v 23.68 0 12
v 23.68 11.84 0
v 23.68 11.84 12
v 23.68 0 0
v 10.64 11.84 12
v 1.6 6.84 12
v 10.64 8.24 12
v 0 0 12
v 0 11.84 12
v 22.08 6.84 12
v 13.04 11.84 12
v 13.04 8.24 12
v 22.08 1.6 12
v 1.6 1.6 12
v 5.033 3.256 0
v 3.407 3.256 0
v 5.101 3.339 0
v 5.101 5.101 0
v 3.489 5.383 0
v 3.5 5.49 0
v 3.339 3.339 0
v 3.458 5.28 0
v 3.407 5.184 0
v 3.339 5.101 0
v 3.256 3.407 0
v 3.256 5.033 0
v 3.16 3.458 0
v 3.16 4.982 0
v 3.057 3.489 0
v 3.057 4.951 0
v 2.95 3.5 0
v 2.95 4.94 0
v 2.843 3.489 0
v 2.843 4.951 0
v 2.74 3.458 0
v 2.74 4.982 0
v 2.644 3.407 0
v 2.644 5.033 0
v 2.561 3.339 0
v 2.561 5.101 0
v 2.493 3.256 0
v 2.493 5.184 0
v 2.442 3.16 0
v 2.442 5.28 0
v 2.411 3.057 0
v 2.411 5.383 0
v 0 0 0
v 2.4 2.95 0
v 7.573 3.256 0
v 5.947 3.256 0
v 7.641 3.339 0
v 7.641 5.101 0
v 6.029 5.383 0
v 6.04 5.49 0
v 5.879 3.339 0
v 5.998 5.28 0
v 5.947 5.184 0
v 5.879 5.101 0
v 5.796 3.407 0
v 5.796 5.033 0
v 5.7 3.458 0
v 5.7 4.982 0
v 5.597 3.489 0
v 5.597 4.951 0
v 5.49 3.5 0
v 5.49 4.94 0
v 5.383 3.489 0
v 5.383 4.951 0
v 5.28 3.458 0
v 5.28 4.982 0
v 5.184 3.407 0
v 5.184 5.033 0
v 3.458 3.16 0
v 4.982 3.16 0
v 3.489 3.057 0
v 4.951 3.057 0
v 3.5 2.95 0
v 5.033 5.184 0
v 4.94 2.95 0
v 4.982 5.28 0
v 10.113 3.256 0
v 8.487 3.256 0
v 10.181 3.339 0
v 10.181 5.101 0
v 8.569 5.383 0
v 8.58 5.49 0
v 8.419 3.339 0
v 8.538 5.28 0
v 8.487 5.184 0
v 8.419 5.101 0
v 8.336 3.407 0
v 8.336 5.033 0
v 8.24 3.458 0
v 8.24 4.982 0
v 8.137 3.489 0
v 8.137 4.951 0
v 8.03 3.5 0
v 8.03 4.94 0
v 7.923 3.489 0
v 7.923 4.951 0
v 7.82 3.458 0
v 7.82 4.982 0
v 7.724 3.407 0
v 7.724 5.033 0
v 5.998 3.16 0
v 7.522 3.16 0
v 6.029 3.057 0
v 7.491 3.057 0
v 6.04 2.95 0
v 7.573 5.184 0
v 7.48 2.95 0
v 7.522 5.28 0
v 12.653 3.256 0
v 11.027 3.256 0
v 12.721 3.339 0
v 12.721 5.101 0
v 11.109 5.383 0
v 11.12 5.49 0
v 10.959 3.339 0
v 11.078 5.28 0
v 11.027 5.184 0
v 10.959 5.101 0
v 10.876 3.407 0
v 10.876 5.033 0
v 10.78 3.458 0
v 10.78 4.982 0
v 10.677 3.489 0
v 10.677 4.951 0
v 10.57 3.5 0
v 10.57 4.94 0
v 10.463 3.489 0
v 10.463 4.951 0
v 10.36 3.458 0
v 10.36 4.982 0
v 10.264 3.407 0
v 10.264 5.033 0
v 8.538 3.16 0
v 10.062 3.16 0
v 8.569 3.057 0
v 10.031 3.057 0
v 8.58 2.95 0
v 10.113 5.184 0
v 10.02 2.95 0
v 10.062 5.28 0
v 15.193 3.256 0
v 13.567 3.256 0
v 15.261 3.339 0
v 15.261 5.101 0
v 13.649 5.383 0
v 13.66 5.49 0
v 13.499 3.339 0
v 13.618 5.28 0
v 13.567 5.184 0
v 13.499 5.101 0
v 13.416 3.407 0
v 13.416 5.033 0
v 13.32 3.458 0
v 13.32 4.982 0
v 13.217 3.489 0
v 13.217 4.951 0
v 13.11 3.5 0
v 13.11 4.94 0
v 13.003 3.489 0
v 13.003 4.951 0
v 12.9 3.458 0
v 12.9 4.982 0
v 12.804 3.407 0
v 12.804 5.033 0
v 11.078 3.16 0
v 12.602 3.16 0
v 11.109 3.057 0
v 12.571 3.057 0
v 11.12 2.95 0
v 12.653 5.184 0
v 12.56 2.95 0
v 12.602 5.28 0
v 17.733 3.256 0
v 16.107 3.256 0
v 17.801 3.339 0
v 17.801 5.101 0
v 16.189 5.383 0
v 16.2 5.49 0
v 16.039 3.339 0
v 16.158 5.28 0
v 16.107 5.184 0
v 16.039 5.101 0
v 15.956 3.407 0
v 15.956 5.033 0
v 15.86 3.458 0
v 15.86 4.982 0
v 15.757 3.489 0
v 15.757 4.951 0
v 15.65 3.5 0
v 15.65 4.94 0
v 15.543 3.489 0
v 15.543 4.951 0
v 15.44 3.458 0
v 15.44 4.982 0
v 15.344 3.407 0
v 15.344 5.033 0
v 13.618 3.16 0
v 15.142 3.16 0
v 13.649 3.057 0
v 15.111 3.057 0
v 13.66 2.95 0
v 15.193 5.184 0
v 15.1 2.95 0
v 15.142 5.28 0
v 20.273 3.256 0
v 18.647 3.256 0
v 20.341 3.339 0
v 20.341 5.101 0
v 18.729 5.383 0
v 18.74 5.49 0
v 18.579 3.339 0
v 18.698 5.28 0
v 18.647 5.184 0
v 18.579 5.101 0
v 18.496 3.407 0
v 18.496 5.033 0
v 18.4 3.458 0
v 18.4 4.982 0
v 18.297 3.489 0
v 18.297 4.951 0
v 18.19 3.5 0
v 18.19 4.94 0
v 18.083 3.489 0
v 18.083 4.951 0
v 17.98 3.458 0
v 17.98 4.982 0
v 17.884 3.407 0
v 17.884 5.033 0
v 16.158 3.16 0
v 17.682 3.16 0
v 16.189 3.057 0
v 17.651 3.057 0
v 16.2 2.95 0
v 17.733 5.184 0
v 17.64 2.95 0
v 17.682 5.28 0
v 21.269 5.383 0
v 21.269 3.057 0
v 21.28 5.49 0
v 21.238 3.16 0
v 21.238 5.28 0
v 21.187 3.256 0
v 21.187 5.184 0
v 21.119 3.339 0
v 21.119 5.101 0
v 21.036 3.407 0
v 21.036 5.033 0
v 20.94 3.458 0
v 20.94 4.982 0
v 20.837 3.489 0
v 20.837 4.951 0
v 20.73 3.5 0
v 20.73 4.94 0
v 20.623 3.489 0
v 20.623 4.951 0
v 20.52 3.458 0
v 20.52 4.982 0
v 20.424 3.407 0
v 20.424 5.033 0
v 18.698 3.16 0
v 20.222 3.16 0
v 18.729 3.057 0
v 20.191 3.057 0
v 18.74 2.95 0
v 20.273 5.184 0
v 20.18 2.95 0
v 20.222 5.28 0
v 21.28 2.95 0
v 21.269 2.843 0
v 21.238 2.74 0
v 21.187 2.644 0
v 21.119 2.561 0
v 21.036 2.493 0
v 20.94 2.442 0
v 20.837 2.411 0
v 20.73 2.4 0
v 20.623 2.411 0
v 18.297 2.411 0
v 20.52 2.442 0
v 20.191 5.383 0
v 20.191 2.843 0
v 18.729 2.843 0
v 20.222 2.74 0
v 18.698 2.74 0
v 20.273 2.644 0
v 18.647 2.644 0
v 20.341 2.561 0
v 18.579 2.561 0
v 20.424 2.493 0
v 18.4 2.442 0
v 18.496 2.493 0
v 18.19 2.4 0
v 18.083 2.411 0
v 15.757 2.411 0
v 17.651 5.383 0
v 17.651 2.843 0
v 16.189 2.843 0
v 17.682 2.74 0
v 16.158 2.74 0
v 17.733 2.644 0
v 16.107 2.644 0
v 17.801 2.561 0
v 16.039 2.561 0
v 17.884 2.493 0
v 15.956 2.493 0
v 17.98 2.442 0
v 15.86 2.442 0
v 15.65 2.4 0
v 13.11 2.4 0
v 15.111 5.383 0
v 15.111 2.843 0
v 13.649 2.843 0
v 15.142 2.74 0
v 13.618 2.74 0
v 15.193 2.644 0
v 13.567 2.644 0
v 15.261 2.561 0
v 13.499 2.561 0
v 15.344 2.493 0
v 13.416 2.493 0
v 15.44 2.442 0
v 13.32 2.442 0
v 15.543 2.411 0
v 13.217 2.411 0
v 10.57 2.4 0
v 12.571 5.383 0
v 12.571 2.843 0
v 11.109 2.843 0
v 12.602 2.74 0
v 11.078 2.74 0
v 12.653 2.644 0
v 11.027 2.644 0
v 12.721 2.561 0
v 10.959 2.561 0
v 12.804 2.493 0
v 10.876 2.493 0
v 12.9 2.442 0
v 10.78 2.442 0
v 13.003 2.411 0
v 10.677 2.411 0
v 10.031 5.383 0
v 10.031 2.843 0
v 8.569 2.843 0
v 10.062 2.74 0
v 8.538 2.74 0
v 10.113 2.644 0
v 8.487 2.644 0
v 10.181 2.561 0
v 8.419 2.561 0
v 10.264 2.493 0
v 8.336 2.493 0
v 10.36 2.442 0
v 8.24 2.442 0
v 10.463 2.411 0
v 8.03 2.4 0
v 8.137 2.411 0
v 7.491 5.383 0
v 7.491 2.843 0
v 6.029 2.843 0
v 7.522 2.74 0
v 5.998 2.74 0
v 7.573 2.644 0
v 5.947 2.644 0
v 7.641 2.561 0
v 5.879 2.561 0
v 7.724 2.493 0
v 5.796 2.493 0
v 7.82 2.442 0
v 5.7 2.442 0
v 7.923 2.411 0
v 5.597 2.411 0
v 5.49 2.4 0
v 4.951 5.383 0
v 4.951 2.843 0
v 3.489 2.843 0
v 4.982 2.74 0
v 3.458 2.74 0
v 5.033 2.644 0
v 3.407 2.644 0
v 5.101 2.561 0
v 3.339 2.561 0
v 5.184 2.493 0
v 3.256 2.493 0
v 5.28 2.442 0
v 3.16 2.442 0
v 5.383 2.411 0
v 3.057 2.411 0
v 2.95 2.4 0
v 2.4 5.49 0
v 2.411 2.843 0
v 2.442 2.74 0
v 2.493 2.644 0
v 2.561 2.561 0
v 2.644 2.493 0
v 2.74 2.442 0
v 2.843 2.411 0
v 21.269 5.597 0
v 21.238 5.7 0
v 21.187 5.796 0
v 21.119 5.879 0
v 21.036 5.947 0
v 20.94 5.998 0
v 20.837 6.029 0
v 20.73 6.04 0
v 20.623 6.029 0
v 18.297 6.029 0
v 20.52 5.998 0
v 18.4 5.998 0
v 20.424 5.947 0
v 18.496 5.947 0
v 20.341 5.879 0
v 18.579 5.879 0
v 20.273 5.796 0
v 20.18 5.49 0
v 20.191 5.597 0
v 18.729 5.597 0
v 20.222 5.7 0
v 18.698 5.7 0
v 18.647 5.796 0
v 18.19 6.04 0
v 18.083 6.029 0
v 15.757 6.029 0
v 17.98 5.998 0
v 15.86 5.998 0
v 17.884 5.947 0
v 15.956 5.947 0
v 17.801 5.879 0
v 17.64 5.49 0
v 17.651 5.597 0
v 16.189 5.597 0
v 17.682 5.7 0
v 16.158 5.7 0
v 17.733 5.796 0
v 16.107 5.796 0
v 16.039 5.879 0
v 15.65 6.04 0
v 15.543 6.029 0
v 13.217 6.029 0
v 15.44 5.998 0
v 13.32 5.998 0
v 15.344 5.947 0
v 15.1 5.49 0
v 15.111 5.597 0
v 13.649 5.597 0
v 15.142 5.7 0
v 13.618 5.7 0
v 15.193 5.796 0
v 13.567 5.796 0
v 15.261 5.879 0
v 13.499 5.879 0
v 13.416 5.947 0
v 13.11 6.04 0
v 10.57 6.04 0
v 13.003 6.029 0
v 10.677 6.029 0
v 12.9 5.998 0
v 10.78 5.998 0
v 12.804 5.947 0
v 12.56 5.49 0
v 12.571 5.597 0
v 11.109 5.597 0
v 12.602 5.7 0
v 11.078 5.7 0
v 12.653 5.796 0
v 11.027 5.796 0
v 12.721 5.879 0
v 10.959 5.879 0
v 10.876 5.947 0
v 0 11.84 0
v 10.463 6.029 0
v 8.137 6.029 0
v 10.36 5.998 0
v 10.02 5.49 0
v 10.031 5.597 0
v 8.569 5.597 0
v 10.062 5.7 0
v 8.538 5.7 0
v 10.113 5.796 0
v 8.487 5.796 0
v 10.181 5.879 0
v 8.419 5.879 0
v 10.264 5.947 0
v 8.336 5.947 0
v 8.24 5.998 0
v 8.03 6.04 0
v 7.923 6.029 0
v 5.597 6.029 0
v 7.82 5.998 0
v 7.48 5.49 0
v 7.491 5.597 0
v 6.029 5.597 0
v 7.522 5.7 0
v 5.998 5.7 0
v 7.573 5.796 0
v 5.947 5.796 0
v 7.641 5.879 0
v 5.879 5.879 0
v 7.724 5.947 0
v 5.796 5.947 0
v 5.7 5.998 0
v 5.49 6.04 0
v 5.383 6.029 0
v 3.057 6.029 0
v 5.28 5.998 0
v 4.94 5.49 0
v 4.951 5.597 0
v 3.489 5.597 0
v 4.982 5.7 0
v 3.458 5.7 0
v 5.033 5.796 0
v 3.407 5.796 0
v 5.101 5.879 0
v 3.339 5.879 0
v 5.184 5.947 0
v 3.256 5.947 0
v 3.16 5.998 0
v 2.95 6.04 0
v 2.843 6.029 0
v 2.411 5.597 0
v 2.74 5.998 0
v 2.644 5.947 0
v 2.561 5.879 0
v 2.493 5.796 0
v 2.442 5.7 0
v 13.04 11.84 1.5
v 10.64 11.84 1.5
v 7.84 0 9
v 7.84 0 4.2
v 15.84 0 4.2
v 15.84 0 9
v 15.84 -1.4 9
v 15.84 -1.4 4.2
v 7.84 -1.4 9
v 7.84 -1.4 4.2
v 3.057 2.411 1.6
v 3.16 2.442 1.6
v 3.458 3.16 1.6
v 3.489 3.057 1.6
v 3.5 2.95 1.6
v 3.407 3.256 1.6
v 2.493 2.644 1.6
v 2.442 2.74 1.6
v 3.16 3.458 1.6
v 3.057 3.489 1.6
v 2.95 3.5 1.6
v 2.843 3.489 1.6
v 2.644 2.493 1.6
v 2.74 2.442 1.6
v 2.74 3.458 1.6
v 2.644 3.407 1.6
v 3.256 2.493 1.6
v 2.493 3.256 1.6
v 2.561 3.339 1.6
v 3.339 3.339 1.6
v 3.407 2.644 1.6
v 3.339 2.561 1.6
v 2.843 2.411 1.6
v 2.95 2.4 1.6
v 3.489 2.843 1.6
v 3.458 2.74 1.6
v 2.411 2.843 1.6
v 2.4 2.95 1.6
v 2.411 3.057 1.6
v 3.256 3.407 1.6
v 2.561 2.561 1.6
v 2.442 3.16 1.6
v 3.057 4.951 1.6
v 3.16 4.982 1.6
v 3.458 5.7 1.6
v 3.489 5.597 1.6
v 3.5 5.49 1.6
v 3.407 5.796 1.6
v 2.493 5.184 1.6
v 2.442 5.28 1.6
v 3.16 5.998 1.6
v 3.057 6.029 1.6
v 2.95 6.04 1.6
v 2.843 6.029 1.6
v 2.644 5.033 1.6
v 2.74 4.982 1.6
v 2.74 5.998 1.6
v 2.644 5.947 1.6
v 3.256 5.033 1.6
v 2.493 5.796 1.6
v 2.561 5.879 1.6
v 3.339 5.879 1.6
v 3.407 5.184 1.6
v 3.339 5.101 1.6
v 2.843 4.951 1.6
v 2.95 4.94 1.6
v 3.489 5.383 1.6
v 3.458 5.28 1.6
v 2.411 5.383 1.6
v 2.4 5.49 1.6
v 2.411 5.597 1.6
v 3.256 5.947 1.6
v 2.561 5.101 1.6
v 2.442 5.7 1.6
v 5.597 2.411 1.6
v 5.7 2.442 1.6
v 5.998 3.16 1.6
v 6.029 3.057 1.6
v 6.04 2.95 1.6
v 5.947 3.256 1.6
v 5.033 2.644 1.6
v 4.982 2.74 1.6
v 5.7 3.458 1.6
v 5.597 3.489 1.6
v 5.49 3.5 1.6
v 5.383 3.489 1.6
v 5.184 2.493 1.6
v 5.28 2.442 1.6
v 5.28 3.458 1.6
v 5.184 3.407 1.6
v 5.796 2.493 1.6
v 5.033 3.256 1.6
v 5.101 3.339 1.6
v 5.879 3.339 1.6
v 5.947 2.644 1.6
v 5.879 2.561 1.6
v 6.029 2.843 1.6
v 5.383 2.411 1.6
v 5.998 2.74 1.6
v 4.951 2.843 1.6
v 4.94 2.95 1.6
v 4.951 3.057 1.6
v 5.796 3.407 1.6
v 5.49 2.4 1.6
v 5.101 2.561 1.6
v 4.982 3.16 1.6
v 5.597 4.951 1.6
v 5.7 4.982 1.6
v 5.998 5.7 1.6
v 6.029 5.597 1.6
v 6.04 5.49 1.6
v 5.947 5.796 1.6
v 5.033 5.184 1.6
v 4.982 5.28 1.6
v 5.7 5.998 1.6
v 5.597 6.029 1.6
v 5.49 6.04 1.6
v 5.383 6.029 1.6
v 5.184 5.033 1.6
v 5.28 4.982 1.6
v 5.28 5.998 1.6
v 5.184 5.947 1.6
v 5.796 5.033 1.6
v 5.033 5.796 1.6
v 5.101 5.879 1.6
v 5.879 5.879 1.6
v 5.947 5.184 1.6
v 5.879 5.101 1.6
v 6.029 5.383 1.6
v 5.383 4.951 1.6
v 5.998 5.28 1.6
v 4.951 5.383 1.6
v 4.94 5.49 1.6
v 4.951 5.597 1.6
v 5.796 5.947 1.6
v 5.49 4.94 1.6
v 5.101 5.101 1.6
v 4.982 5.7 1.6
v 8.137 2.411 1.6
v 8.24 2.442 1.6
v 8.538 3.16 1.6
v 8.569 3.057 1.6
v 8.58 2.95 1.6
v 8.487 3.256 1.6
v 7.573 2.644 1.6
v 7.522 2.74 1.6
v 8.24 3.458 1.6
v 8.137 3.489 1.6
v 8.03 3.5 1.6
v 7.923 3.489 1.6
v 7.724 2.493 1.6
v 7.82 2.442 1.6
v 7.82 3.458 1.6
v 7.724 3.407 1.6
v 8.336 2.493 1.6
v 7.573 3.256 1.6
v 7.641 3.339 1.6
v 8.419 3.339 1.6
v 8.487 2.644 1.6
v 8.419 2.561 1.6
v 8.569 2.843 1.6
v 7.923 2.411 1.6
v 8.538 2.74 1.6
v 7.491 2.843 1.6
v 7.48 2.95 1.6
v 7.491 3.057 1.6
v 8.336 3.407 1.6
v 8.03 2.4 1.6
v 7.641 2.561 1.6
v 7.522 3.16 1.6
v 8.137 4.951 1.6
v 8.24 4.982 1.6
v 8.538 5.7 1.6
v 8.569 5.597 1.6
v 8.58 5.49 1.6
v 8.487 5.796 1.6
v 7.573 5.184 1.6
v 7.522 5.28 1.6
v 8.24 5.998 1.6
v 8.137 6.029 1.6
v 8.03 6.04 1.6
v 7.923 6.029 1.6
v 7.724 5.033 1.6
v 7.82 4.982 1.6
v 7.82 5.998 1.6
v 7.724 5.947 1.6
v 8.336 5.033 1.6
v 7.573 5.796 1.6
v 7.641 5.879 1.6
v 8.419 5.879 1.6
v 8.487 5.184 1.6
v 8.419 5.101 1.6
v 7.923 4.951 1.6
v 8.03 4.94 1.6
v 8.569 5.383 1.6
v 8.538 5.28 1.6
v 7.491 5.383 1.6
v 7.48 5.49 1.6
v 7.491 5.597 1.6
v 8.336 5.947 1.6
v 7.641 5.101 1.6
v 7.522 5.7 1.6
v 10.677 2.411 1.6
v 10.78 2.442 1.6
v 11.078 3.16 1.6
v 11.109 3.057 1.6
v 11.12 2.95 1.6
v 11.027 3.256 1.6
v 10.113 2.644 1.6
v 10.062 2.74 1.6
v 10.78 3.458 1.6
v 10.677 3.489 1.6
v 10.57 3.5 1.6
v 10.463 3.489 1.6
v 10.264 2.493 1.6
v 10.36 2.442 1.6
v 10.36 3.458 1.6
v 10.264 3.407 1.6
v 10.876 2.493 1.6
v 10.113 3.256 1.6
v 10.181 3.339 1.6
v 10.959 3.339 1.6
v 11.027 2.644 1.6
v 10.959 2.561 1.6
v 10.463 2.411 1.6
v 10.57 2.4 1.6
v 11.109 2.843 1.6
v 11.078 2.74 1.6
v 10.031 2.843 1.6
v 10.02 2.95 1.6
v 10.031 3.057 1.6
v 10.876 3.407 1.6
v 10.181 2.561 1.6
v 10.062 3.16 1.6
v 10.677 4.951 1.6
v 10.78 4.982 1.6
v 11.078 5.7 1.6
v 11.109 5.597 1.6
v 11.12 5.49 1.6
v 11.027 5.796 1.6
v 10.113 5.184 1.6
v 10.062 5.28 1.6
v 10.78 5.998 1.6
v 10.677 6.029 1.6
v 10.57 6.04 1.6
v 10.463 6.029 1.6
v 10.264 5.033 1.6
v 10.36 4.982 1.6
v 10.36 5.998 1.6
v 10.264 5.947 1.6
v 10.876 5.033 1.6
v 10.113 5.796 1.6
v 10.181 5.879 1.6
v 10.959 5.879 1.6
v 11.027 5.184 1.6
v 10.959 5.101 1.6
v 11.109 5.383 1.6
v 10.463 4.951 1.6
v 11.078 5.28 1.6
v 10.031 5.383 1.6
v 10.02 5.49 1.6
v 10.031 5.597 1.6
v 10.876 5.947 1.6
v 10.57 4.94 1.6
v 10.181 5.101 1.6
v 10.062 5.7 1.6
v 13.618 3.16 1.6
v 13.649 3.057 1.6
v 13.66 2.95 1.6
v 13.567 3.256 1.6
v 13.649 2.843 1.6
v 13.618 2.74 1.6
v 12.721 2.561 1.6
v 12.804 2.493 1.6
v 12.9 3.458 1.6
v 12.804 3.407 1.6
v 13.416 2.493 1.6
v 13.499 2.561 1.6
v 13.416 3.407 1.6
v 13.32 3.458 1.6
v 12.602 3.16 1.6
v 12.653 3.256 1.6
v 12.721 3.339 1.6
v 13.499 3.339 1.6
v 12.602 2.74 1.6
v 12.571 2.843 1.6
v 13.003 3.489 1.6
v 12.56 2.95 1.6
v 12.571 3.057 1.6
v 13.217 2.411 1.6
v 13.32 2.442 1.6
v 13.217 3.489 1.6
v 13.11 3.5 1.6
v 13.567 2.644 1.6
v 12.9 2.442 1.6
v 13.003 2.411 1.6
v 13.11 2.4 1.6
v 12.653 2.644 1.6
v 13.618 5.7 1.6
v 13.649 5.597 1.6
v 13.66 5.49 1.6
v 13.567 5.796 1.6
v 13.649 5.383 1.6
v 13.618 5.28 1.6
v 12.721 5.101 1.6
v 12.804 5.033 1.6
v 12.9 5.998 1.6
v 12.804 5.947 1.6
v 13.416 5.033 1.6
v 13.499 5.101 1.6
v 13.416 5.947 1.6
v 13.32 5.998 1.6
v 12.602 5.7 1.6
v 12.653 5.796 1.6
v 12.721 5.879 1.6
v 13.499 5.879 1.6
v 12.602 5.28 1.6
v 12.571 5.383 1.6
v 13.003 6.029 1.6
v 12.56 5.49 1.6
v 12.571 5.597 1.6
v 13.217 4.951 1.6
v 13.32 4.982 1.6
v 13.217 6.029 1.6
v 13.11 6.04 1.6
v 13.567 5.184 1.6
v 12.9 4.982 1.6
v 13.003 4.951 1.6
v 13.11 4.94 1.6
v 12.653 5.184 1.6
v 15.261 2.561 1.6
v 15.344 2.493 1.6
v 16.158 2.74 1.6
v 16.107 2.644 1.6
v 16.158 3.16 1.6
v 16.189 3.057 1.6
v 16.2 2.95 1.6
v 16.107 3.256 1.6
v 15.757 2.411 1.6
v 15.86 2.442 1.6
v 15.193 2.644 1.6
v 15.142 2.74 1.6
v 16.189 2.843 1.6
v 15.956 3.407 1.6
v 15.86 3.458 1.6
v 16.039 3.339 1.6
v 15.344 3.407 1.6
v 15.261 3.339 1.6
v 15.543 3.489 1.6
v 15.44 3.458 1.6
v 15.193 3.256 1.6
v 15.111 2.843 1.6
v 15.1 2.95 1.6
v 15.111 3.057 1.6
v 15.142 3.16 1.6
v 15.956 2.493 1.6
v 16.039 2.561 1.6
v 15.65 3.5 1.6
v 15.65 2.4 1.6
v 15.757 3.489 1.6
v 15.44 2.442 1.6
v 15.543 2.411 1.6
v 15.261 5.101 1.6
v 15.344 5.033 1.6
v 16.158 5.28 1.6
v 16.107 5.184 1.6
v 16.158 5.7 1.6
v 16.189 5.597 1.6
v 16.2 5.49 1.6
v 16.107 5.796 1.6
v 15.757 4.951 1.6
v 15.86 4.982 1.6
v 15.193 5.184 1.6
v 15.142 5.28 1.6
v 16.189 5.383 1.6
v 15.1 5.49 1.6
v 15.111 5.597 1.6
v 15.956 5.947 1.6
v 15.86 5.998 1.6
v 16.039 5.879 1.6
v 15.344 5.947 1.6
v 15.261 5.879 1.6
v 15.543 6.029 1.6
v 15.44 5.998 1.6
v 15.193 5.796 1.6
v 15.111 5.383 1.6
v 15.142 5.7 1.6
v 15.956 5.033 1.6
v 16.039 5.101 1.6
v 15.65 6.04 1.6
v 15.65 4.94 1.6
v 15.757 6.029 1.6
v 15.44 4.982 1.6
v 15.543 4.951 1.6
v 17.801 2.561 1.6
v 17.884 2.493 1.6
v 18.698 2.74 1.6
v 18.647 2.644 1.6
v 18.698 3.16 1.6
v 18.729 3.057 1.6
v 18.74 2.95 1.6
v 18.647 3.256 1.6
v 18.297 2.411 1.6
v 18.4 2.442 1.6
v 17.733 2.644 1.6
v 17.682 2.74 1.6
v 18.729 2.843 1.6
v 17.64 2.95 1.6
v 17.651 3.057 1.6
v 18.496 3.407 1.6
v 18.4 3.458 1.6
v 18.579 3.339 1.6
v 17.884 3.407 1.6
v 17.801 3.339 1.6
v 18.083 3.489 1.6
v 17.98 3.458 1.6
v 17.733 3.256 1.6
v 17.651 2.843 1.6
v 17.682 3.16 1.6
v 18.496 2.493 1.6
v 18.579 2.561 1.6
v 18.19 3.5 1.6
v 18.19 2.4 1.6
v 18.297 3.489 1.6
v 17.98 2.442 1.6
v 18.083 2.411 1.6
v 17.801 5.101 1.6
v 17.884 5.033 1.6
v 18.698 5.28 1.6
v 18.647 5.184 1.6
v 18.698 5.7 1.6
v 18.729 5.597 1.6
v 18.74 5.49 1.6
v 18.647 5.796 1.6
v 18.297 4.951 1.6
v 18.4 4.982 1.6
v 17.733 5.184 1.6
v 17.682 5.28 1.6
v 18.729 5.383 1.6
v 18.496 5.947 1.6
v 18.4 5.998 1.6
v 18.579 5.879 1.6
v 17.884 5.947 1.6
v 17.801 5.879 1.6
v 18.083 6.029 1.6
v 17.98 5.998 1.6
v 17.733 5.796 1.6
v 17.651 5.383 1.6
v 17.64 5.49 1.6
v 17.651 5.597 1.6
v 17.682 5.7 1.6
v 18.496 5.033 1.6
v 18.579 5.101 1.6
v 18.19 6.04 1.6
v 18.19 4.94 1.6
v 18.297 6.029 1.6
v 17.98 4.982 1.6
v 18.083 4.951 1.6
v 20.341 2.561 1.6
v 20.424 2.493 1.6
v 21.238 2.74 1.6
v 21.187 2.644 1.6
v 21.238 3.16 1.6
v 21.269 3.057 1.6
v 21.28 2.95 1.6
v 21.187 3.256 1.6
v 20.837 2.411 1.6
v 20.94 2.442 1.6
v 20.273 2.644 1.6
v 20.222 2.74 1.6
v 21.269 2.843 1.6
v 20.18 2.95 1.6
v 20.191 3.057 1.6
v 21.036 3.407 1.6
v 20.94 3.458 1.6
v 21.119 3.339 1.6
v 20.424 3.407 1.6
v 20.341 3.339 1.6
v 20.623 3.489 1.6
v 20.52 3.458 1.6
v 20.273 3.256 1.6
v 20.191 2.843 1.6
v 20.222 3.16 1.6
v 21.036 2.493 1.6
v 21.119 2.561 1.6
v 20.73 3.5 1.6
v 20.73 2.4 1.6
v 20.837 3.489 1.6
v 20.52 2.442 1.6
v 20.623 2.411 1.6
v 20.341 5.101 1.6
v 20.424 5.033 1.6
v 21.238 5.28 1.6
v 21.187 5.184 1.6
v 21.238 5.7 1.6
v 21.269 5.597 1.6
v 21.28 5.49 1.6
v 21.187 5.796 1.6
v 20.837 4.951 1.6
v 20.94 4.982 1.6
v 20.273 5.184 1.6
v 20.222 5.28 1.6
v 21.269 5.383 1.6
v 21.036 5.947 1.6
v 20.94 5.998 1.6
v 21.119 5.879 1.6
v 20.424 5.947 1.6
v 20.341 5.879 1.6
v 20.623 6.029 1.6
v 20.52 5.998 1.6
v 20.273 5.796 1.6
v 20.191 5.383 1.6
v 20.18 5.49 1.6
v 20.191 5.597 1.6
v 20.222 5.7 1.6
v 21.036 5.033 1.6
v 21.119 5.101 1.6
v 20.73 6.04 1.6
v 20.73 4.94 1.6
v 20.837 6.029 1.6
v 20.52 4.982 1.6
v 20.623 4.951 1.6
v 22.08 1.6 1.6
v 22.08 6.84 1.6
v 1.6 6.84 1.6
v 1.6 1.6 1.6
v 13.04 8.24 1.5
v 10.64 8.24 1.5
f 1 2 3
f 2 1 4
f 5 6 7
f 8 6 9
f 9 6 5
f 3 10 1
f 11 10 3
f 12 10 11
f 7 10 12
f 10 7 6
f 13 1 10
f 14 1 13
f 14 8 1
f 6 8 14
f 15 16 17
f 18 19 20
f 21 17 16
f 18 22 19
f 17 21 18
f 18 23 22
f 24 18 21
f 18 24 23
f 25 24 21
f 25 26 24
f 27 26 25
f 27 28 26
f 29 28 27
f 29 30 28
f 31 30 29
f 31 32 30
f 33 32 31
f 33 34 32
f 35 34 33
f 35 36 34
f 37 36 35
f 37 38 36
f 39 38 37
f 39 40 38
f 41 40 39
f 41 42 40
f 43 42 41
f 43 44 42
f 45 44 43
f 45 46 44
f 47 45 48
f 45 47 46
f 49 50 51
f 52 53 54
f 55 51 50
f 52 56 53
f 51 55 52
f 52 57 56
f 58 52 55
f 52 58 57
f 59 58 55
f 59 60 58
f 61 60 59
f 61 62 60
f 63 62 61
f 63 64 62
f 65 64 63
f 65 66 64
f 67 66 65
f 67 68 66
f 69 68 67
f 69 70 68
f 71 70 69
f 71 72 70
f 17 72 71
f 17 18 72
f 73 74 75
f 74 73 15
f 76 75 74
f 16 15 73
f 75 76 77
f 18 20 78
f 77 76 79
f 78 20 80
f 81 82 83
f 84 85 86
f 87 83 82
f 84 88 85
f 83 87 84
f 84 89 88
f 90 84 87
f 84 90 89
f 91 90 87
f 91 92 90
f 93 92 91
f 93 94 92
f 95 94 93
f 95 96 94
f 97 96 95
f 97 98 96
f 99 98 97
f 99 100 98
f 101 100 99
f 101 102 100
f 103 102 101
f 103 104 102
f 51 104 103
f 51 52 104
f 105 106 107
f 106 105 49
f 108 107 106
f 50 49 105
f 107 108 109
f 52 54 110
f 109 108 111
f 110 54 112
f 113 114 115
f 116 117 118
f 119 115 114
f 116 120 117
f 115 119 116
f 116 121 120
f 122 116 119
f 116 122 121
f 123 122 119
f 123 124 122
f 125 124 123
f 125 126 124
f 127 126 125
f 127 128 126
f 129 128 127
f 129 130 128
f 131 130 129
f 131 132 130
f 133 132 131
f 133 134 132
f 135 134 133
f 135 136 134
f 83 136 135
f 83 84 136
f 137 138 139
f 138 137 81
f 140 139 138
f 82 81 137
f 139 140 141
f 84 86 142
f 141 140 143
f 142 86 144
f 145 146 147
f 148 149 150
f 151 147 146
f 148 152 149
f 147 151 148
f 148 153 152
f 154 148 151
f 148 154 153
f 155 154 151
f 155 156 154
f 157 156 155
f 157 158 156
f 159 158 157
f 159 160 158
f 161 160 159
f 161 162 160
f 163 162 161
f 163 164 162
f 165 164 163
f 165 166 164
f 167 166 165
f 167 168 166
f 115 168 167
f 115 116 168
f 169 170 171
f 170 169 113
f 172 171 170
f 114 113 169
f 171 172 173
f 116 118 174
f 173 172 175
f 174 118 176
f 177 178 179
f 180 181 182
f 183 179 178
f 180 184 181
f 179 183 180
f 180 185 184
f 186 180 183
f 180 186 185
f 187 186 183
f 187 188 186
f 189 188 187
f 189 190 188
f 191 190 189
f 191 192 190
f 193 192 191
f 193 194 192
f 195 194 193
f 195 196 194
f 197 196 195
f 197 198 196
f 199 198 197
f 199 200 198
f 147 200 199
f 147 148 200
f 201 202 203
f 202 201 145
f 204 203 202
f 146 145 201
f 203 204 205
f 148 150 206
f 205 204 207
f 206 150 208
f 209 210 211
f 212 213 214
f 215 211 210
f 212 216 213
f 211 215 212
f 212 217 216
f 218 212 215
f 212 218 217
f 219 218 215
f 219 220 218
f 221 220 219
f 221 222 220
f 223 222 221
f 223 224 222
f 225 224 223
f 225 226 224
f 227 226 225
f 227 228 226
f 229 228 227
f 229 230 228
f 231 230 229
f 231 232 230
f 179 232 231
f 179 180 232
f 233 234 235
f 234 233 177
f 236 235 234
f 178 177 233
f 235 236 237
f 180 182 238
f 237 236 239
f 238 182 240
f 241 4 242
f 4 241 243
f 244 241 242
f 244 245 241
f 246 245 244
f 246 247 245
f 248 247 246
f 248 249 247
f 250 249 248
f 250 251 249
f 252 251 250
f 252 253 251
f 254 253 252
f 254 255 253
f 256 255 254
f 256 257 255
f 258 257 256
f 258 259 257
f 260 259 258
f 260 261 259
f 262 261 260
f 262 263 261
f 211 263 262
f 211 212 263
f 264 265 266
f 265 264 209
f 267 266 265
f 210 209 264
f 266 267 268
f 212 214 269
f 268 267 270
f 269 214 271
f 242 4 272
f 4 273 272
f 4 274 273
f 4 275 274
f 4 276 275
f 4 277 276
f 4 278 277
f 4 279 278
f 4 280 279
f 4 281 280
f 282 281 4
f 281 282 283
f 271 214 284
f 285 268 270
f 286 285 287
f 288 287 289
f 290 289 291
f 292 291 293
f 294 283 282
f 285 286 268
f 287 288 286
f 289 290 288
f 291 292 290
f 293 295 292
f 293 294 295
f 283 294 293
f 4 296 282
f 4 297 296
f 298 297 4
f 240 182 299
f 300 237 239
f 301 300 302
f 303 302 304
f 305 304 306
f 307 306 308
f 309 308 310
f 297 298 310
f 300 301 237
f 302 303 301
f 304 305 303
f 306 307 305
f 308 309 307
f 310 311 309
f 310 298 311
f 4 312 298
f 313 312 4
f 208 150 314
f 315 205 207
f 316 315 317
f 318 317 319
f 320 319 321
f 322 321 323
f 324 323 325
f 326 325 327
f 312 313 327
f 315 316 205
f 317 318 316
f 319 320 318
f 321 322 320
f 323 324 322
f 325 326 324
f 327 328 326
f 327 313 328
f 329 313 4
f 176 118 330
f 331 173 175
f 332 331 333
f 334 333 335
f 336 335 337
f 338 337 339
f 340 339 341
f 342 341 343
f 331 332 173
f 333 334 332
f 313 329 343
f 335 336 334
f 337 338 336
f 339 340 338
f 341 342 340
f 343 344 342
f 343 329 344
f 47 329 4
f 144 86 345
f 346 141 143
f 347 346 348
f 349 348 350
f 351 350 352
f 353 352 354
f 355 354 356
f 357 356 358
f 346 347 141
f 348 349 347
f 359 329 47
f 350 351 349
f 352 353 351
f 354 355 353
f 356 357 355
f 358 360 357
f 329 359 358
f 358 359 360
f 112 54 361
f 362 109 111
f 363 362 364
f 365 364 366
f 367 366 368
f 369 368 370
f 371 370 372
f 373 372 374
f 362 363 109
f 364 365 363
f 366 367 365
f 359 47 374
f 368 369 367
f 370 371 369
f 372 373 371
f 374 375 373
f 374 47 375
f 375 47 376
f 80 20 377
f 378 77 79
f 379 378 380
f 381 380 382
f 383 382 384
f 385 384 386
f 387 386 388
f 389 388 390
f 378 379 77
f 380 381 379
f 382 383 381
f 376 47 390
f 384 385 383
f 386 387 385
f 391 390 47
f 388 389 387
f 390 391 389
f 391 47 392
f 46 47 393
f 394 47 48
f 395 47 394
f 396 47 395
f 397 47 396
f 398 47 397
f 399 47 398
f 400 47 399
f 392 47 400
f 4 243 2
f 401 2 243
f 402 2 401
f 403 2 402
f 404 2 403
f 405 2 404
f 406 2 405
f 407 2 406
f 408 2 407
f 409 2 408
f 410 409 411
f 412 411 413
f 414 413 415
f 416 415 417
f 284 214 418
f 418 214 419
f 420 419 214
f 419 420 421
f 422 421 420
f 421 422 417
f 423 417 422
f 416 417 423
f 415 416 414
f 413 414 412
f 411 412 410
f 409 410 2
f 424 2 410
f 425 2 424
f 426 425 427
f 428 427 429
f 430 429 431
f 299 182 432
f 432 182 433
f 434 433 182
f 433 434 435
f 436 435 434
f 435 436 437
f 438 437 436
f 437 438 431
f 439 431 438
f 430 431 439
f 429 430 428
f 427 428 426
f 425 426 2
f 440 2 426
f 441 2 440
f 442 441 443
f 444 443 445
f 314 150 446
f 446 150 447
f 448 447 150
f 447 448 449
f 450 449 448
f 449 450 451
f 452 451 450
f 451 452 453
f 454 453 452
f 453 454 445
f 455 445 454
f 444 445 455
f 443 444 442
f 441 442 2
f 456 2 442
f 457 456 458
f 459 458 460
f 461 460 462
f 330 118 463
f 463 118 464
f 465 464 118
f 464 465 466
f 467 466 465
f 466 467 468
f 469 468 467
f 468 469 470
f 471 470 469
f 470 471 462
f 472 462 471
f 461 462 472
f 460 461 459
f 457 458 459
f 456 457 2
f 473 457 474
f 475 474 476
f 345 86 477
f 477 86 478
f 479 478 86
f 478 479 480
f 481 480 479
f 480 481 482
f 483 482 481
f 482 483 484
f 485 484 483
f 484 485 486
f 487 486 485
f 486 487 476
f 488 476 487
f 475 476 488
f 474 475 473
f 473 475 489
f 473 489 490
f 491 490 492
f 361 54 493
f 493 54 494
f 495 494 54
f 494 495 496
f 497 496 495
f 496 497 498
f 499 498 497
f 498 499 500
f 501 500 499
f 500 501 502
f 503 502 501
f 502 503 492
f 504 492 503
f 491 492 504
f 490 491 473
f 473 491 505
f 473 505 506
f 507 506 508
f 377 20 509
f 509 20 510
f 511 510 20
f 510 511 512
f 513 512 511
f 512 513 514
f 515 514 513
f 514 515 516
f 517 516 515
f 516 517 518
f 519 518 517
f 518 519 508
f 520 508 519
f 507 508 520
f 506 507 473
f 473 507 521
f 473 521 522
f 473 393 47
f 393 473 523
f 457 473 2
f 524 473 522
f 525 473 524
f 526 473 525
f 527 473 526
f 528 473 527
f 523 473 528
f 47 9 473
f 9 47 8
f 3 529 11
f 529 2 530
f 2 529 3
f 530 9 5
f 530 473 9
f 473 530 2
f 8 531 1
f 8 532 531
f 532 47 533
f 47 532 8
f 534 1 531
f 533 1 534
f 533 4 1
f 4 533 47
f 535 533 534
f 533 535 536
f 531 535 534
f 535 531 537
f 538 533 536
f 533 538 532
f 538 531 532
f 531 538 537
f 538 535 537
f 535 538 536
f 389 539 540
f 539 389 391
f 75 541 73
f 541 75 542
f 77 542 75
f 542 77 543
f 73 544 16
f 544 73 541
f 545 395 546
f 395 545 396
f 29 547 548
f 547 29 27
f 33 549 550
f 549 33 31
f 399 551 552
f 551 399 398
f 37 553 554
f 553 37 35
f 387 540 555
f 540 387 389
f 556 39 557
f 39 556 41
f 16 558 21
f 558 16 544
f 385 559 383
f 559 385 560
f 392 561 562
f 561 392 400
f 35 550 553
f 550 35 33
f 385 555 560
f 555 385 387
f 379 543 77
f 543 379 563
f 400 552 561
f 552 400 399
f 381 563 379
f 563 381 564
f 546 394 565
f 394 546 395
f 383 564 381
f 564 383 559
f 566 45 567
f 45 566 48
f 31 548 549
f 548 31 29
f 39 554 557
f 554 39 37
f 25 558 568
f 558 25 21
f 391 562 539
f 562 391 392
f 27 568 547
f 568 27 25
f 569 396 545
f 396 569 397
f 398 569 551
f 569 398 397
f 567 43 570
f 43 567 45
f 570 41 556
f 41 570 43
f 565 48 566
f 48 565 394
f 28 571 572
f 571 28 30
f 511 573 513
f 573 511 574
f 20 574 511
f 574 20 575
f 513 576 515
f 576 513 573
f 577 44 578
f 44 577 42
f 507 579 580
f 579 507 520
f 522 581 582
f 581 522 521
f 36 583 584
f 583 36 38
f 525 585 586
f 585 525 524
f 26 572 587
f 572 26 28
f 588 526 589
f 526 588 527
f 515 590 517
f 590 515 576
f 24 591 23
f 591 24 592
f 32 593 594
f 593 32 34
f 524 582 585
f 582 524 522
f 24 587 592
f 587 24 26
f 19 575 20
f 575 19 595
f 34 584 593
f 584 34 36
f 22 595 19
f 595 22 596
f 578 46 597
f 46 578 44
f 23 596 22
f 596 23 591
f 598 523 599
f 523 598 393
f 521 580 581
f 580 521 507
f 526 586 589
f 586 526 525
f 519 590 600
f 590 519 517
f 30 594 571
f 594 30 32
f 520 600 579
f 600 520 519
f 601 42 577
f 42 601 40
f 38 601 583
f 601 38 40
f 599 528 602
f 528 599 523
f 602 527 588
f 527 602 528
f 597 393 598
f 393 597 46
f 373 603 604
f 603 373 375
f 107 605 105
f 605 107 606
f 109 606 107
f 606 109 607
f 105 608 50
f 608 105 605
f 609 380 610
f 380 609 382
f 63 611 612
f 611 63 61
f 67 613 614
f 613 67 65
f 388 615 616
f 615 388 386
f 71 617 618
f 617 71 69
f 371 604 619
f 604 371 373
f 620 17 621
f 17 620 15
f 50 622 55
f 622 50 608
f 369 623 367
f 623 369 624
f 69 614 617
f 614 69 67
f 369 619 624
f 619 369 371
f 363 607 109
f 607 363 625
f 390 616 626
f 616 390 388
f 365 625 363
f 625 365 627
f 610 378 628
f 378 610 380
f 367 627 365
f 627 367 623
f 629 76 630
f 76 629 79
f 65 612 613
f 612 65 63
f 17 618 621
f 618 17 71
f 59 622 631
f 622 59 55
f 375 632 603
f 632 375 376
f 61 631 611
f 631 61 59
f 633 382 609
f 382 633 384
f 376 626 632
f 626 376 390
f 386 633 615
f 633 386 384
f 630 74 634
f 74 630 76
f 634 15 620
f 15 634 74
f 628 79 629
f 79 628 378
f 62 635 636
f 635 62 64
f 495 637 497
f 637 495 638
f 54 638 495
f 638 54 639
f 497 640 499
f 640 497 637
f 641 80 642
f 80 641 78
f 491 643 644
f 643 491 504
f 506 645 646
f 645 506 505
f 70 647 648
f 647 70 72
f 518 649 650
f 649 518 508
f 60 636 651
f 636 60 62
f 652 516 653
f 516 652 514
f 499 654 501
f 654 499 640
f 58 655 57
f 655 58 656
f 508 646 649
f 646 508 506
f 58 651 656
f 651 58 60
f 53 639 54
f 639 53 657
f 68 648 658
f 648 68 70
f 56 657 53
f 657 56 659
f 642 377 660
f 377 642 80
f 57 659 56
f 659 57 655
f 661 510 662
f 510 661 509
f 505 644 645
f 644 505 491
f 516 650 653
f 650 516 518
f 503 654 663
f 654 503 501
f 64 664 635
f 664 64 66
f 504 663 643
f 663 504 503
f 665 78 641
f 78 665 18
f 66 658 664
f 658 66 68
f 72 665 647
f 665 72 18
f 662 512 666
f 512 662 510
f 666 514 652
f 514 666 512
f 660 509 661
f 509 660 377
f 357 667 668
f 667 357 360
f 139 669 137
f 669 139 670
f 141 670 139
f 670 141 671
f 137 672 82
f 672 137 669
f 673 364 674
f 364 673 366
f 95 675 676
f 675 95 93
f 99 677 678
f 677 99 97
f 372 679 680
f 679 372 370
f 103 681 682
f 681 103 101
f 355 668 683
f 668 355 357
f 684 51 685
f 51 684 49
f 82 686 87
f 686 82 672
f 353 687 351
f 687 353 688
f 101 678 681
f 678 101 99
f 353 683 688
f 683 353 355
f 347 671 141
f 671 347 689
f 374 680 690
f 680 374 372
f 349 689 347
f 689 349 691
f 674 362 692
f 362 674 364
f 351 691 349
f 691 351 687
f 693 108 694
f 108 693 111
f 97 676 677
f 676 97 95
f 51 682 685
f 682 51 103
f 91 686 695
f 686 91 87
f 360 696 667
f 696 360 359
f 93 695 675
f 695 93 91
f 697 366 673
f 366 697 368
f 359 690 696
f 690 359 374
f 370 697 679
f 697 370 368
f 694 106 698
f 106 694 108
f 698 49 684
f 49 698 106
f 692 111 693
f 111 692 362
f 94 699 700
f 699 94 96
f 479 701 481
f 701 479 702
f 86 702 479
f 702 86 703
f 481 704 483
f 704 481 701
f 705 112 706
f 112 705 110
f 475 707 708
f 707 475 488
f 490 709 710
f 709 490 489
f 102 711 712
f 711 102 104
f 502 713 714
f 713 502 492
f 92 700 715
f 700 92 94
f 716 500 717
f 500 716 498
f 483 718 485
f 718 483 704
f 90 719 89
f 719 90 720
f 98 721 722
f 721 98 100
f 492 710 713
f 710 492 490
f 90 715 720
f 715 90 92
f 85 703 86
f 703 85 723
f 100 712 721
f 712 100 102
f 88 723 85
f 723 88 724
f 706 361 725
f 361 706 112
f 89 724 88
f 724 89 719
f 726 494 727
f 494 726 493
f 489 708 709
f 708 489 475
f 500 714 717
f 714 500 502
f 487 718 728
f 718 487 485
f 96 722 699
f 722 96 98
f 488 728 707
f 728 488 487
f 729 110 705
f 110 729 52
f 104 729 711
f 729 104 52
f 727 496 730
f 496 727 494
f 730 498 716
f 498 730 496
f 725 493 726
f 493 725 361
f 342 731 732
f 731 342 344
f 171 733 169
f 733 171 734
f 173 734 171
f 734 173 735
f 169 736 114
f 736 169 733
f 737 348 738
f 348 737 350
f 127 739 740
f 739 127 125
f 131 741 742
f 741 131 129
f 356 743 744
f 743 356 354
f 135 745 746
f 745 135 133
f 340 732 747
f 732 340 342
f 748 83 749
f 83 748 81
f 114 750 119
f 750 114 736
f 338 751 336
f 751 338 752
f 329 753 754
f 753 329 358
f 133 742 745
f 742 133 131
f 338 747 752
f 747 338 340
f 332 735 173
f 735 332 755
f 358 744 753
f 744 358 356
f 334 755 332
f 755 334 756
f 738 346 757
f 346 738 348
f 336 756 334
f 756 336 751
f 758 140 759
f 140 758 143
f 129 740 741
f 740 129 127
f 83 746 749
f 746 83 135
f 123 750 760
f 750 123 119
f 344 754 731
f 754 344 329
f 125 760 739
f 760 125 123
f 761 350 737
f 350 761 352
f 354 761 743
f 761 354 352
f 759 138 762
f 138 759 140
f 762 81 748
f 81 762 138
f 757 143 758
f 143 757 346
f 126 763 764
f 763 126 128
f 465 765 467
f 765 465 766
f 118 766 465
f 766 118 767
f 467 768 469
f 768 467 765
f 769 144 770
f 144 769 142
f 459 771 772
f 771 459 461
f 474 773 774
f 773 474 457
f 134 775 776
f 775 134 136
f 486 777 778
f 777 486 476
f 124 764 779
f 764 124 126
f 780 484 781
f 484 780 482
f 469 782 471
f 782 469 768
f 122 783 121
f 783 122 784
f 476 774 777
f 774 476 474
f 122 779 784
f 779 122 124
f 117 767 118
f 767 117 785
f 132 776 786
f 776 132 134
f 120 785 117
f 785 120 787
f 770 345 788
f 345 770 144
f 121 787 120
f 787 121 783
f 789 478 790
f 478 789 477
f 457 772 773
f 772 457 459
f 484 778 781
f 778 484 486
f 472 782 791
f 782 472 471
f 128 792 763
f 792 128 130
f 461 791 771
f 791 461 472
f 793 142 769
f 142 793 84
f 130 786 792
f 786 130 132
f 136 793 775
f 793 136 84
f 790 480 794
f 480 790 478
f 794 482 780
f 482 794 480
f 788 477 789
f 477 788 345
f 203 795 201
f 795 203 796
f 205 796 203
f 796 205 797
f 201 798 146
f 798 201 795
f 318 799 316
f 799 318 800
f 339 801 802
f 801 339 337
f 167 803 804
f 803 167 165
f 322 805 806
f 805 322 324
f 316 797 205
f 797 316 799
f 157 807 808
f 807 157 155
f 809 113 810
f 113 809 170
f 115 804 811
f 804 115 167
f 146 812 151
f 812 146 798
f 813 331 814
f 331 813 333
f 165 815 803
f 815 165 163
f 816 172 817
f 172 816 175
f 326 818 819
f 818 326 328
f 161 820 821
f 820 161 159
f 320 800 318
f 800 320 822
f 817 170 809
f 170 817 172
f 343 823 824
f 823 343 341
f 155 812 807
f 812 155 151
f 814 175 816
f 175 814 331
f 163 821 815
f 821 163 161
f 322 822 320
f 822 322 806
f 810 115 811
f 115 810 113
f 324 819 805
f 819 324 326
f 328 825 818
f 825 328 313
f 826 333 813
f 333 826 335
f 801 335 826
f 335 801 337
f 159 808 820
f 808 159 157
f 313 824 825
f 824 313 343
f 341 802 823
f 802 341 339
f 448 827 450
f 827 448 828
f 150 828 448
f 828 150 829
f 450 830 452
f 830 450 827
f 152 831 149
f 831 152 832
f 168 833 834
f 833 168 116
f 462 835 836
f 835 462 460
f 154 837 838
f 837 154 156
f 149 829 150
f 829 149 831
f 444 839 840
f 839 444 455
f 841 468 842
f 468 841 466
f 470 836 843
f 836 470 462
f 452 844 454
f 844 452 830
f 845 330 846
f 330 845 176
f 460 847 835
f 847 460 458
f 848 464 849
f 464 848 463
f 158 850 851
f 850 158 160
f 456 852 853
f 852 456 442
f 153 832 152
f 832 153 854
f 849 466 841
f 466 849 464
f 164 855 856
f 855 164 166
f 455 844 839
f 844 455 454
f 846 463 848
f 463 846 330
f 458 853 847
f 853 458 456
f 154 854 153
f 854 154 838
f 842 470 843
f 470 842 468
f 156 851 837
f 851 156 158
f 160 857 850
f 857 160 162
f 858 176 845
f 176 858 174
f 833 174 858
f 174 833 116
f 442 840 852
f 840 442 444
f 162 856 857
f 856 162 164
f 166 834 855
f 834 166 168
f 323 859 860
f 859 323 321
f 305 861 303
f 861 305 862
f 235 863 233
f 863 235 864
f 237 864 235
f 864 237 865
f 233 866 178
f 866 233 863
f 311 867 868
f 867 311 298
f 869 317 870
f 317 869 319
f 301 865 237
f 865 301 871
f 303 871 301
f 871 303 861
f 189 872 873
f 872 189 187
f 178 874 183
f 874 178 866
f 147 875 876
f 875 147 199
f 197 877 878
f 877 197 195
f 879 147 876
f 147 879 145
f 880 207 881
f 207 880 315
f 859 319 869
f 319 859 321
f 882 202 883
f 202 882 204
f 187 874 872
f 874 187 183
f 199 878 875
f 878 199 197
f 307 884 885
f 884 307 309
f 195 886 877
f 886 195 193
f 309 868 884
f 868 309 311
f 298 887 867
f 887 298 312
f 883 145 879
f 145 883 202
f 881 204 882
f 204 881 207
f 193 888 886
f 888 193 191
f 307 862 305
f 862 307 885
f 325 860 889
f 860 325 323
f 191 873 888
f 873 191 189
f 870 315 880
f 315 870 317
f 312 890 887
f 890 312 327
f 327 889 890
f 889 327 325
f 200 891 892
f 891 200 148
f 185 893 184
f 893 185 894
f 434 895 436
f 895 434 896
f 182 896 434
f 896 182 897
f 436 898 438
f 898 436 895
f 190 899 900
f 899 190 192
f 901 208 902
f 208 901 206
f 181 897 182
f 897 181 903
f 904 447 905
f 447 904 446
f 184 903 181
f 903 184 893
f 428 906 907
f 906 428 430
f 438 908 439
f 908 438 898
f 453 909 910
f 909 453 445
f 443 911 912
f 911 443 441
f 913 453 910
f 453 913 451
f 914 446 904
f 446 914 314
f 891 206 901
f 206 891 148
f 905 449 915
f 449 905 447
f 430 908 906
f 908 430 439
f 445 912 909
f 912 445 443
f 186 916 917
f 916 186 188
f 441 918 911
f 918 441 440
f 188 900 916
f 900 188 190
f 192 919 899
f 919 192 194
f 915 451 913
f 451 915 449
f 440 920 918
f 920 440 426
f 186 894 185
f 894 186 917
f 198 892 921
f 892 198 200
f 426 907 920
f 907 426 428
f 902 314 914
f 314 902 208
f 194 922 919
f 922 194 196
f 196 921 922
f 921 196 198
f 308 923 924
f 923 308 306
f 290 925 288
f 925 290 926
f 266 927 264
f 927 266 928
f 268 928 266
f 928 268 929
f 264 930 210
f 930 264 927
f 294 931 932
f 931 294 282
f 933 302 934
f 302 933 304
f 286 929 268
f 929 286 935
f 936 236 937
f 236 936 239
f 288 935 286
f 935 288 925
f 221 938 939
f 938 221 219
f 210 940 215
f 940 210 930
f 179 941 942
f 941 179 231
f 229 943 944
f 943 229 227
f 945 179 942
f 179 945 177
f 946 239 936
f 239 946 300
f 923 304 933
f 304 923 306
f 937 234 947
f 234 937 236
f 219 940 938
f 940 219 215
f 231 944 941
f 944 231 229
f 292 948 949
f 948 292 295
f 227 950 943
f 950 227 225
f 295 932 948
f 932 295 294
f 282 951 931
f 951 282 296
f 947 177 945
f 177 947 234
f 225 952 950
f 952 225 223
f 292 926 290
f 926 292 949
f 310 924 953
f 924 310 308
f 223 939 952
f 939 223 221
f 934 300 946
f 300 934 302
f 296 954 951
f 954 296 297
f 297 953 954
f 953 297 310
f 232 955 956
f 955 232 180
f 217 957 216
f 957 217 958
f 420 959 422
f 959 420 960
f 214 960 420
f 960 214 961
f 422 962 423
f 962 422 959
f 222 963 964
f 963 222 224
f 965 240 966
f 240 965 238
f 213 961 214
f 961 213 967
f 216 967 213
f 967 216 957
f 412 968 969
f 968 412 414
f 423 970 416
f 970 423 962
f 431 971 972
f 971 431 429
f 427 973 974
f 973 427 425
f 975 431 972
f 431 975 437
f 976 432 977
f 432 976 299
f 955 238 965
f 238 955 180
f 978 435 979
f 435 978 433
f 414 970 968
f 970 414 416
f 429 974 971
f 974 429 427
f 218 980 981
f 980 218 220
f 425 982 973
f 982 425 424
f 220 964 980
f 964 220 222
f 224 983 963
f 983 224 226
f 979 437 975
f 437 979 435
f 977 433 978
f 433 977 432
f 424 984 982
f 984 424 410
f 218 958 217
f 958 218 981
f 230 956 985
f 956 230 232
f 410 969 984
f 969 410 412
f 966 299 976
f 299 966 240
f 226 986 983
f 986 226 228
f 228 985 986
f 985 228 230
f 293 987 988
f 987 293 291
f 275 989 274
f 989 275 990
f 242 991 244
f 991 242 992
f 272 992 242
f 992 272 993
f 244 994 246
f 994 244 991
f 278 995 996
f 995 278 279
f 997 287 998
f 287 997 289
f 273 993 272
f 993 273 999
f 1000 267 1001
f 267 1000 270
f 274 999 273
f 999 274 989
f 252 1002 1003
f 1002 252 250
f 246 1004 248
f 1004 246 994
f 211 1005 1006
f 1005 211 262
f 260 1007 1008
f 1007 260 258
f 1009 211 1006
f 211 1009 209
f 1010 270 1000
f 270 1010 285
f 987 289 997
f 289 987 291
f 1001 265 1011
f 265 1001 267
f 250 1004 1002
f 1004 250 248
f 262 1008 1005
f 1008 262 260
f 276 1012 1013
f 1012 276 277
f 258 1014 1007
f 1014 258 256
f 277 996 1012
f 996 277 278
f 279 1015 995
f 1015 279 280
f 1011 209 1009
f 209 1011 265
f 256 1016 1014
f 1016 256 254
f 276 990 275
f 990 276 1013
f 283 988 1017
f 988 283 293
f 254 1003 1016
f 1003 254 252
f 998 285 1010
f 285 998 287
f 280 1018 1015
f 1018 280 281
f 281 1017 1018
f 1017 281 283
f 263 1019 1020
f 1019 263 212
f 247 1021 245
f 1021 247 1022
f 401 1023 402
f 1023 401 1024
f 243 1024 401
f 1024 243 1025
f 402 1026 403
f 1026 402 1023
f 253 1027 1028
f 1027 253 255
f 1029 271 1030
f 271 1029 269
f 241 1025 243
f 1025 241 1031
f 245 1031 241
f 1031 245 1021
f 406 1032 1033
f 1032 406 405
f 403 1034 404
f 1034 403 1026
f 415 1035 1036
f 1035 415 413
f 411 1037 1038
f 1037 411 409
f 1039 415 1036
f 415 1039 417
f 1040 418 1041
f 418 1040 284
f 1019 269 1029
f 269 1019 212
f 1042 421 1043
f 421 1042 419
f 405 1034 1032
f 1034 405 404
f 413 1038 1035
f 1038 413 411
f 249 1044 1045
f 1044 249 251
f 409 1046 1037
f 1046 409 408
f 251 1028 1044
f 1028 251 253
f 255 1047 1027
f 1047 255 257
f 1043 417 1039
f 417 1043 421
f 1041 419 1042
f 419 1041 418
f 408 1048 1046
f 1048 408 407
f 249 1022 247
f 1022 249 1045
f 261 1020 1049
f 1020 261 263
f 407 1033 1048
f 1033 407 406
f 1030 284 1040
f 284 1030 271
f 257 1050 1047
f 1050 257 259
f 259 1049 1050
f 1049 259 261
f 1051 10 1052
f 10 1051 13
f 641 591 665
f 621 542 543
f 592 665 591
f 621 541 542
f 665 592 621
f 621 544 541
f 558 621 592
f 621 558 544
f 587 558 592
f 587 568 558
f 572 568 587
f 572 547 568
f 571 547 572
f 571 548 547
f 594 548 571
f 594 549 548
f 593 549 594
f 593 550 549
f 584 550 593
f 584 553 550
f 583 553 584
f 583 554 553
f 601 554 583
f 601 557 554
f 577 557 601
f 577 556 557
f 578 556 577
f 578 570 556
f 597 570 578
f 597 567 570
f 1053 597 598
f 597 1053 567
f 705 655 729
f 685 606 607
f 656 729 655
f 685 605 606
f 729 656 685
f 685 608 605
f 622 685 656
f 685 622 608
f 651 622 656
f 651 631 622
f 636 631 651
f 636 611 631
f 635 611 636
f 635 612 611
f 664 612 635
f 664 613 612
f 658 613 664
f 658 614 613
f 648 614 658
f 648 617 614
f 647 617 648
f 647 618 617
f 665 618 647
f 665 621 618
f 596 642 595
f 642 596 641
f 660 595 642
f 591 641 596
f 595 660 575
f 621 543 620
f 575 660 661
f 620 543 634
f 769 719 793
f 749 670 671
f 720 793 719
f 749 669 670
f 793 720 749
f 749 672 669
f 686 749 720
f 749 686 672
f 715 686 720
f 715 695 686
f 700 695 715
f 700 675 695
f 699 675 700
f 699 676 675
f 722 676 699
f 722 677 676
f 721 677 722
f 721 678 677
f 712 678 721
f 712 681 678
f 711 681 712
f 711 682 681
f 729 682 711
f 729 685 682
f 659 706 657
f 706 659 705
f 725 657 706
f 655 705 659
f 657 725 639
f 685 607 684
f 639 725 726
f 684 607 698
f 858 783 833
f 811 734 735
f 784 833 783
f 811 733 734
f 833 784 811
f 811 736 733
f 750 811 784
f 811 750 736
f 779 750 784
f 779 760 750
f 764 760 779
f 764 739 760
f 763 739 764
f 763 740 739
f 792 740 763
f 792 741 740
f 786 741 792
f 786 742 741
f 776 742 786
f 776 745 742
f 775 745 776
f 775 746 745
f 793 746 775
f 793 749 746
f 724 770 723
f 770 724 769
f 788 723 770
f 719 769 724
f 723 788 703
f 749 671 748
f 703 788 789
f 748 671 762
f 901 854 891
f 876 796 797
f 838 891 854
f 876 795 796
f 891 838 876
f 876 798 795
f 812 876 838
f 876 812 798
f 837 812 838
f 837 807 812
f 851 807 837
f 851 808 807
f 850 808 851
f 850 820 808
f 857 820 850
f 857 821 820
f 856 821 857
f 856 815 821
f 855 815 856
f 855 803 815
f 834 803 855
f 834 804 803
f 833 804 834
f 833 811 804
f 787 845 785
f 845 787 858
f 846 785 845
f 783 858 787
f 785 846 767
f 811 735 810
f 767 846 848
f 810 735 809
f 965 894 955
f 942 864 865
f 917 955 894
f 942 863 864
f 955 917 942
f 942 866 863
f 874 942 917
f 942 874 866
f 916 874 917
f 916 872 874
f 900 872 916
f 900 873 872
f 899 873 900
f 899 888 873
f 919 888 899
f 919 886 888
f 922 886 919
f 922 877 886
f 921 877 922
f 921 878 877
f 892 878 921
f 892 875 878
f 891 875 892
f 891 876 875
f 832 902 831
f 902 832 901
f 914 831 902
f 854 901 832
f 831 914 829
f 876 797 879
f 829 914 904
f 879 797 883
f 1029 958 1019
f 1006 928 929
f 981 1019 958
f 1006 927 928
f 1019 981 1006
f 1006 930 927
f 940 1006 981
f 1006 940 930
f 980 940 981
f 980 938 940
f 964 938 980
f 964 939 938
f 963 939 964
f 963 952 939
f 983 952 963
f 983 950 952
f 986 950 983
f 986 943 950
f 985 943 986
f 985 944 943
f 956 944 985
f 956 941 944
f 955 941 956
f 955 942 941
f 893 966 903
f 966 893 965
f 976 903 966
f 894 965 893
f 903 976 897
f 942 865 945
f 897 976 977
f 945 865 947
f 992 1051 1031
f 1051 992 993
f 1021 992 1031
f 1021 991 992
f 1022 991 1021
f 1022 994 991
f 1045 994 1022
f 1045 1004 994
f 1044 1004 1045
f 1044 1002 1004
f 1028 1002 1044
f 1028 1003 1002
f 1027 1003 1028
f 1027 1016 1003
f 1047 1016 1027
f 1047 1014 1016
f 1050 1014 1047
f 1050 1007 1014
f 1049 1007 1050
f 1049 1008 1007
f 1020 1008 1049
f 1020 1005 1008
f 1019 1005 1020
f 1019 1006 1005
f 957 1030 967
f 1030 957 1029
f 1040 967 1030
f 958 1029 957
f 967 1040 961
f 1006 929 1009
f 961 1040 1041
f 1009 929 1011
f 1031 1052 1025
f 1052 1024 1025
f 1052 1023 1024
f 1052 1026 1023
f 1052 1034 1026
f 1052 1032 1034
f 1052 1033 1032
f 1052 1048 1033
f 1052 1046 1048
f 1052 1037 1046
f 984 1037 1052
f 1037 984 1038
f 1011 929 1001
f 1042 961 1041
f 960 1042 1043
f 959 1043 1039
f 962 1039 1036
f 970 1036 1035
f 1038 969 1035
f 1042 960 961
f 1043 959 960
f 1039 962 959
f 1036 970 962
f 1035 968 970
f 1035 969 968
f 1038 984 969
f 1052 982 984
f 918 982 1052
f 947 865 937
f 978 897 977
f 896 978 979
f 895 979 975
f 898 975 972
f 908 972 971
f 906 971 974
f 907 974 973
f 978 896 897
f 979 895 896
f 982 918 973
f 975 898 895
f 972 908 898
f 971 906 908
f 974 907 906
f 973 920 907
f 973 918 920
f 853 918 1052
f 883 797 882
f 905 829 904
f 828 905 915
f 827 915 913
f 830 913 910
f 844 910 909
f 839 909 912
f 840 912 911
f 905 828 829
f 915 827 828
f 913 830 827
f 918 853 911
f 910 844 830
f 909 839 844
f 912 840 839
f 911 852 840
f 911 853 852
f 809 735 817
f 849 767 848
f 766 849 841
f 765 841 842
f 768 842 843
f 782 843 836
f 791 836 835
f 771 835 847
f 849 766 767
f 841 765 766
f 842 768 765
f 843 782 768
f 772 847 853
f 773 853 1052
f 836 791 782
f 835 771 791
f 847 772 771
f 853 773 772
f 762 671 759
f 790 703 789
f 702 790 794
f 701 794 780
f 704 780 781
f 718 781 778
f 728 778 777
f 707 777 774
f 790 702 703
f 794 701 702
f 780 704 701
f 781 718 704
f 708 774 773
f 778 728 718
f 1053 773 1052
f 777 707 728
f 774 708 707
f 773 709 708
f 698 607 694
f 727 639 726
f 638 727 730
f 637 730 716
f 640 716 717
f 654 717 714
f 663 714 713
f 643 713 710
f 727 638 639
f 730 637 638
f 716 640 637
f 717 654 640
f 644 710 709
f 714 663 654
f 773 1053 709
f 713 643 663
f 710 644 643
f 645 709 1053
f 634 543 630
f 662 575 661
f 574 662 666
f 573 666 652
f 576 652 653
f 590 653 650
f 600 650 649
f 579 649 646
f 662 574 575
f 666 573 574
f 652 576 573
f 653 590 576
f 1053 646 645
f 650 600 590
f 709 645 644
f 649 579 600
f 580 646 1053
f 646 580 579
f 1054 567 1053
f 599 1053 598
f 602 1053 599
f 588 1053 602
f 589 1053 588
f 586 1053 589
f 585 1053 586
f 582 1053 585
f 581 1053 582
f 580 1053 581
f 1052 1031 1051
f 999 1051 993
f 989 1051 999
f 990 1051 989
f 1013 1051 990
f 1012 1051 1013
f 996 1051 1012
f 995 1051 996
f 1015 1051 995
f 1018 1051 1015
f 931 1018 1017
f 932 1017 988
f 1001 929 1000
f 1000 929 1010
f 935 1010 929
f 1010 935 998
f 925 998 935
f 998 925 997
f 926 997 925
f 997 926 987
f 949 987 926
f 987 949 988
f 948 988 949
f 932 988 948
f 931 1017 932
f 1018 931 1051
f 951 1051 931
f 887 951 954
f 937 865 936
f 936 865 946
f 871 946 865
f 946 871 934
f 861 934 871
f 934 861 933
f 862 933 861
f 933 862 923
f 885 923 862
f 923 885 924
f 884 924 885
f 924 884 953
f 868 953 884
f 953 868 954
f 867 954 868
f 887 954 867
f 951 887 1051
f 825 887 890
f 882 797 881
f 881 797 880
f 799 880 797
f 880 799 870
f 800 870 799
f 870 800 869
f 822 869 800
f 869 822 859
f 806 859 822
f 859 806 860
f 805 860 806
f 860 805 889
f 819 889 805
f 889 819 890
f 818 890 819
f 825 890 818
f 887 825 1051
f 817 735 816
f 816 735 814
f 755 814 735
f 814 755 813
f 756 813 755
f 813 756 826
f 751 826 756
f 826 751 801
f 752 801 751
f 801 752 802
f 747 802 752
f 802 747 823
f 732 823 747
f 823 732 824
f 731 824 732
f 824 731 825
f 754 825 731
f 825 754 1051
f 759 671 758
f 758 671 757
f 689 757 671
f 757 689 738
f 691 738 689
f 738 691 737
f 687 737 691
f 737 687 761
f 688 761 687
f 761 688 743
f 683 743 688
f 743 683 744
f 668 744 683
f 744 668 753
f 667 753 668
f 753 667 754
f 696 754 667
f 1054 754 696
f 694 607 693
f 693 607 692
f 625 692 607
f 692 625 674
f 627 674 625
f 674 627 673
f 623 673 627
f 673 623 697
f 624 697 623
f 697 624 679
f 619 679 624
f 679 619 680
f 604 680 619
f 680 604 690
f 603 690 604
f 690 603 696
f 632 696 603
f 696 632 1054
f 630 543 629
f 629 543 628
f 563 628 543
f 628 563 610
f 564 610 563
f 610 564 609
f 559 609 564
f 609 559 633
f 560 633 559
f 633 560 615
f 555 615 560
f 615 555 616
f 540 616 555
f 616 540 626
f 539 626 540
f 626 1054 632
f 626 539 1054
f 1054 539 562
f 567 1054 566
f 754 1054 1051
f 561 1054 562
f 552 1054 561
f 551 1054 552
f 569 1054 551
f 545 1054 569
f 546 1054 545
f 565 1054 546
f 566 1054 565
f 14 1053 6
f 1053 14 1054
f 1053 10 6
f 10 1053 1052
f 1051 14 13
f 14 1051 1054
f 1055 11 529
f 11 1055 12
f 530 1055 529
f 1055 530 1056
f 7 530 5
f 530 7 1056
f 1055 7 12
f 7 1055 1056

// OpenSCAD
// =============================================================================
// PLACEHOLDER — generic female multi-pin SHELL
// =============================================================================
// TODO: pitch unknown until callipers.
// TODO: pin count, row spacing, keying, latch, and wire gauge unknown.
//
// This is NOT an AP1 drop-in. Do not mate this to a factory Honda plug
// and do not treat it as a cluster-harness replica.
//
// Bay / plug callipers are REQUIRED before any print that touches the car.
// Print in PETG or ASA. Do NOT use PLA in the cabin.
// =============================================================================

$fn = 32;

// Must stay in lock-step with connector_male_placeholder.scad guesses.
// Both files are still wrong until the real connector is measured.
pin_pitch = 2.54;       // TODO: pitch unknown until callipers
rows = 2;
cols = 8;
pin_d = 0.8;            // TODO: socket ID unknown
row_pitch = 2.54;       // TODO: row spacing unknown

wall = 1.6;
cavity_extra = 1.2;
slip = 0.3;             // extra on the ID so the male *might* start — still a guess
body_h = 12.0;
polarizer_w = 2.4;
polarizer_h = 3.4;
latch_w = 8.0;
latch_t = 1.4;

grid_w = (cols - 1) * pin_pitch;
grid_h = (rows - 1) * row_pitch;
body_w = grid_w + 2 * cavity_extra + 2 * wall + slip;
body_d = grid_h + 2 * cavity_extra + 2 * wall + polarizer_h + slip;

module socket_at(c, r) {
    translate([
        wall + cavity_extra + slip / 2 + c * pin_pitch,
        wall + cavity_extra + slip / 2 + r * row_pitch,
        -0.1
    ])
        cylinder(h = body_h + 0.2, d = pin_d + 0.3);
}

module female_shell() {
    difference() {
        union() {
            cube([body_w, body_d, body_h]);
            // Crude latch tab — geometry is fiction until callipers
            translate([body_w / 2 - latch_w / 2, -latch_t, body_h * 0.35])
                cube([latch_w, latch_t + 0.2, body_h * 0.4]);
        }

        // Mating pocket
        translate([wall, wall, wall])
            cube([
                body_w - 2 * wall,
                body_d - 2 * wall - polarizer_h,
                body_h
            ]);

        // Polarizer slot (mirrors the male rib — side still a guess)
        translate([
            body_w / 2 - polarizer_w / 2,
            body_d - polarizer_h - 0.2,
            1.5
        ])
            cube([polarizer_w, polarizer_h + 0.4, body_h]);

        for (c = [0 : cols - 1], r = [0 : rows - 1])
            socket_at(c, r);
    }
}

female_shell();
